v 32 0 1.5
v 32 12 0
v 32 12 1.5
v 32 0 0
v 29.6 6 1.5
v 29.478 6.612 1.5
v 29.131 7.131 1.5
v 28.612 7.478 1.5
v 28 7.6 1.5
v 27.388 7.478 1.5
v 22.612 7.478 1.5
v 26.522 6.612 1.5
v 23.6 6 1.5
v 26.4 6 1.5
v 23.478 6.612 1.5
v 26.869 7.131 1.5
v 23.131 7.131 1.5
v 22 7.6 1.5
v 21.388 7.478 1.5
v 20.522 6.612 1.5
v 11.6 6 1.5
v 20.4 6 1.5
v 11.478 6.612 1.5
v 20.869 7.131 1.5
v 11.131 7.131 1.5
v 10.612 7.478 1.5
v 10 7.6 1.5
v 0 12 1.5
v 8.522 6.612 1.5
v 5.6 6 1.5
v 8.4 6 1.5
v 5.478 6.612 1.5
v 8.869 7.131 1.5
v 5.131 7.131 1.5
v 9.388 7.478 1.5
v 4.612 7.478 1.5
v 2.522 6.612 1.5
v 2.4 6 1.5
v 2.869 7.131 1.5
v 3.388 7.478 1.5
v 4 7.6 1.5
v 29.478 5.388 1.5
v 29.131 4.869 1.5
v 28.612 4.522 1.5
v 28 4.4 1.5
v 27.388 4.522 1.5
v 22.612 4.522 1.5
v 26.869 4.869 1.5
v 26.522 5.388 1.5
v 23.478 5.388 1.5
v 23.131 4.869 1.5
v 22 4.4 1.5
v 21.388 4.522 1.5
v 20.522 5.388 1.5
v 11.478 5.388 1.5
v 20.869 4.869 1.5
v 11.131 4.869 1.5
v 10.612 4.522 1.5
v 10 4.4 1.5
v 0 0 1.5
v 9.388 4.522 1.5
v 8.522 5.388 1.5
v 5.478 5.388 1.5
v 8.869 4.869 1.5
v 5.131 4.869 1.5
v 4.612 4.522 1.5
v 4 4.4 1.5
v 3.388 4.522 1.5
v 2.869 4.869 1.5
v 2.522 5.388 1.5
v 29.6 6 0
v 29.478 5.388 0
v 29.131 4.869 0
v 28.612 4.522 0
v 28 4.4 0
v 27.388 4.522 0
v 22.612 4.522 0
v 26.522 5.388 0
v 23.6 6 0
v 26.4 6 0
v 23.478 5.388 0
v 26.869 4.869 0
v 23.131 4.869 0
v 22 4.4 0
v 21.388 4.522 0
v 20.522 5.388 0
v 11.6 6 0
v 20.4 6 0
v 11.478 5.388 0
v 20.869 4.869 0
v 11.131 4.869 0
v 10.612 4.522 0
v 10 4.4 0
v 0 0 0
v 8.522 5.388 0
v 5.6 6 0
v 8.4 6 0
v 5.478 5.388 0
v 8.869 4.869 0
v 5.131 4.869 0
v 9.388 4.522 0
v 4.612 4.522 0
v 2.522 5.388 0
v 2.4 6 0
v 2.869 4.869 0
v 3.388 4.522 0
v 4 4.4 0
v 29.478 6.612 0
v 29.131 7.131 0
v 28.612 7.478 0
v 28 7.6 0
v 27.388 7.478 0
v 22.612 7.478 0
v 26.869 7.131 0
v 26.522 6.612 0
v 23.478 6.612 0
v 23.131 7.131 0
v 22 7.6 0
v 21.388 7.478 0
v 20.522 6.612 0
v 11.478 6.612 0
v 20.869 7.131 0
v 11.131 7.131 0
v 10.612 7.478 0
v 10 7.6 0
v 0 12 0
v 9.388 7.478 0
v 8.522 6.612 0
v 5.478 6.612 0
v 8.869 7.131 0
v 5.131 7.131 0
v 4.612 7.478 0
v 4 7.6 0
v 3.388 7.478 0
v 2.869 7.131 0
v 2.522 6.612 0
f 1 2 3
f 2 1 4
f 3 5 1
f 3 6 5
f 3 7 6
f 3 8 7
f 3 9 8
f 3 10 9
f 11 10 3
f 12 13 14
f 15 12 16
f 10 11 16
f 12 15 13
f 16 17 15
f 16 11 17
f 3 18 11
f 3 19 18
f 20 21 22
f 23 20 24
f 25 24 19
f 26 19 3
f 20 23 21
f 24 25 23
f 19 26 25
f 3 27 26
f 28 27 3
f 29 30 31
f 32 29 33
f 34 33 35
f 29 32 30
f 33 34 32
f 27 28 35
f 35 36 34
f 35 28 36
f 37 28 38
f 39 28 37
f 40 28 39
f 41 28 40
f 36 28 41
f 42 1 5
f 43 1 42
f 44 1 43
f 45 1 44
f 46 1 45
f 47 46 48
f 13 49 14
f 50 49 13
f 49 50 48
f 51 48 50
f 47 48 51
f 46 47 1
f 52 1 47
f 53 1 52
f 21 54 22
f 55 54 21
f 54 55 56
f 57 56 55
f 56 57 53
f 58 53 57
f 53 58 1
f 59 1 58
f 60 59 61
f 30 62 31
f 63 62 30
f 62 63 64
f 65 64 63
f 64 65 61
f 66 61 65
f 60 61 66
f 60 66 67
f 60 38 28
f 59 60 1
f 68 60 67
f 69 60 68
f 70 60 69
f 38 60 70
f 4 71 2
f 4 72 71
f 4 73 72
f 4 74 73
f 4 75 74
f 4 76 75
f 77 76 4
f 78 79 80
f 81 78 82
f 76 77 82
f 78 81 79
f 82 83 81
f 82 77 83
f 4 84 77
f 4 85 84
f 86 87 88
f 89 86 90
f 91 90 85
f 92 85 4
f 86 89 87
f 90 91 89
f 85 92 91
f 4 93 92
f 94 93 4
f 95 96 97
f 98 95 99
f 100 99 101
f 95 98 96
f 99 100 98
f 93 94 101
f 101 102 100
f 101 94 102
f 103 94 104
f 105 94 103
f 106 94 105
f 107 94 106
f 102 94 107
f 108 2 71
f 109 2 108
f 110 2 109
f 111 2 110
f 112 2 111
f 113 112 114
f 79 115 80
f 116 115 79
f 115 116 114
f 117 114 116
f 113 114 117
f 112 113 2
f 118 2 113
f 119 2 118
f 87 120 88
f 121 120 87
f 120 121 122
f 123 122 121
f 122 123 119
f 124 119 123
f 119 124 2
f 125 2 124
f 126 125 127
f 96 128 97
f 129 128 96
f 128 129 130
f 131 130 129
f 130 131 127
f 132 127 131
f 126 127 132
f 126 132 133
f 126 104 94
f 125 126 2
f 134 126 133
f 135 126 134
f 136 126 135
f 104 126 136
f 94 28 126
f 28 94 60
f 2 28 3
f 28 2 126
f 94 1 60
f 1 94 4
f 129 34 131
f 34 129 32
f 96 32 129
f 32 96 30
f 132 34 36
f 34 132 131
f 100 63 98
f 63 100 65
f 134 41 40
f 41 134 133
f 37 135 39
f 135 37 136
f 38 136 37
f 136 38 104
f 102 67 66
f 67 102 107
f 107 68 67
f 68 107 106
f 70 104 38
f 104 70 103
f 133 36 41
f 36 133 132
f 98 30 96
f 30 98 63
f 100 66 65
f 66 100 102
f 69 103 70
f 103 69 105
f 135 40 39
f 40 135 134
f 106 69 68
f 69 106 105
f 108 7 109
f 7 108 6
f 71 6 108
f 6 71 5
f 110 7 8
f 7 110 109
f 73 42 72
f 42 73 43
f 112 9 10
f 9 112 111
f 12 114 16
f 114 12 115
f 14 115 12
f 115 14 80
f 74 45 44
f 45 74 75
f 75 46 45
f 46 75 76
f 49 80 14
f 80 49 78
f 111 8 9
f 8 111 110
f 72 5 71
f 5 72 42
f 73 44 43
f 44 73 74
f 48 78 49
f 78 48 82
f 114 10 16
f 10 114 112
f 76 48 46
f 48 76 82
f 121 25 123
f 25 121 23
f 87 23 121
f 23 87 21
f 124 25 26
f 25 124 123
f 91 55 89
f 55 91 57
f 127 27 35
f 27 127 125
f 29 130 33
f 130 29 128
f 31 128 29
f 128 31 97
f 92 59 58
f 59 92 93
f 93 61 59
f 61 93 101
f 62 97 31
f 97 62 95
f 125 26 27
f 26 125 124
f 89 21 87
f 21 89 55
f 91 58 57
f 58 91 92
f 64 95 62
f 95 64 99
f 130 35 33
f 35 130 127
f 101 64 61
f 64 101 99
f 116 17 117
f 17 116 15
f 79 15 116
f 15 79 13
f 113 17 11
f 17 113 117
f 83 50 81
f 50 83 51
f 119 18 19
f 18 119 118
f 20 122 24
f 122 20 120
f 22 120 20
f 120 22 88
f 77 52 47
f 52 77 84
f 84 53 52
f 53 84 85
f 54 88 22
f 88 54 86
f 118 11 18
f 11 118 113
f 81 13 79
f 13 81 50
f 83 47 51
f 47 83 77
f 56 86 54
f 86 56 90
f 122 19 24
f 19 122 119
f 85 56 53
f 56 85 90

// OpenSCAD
difference() {   
  cube([32, 12, 1.5]);
  translate([4,6,-1]) cylinder(d=3.2, h=20, $fn=16);
  translate([28,6,-1]) cylinder(d=3.2, h=20, $fn=16);

  translate([10,6,-1]) cylinder(d=3.2, h=20, $fn=16);
  translate([22,6,-1]) cylinder(d=3.2, h=20, $fn=16);

}
